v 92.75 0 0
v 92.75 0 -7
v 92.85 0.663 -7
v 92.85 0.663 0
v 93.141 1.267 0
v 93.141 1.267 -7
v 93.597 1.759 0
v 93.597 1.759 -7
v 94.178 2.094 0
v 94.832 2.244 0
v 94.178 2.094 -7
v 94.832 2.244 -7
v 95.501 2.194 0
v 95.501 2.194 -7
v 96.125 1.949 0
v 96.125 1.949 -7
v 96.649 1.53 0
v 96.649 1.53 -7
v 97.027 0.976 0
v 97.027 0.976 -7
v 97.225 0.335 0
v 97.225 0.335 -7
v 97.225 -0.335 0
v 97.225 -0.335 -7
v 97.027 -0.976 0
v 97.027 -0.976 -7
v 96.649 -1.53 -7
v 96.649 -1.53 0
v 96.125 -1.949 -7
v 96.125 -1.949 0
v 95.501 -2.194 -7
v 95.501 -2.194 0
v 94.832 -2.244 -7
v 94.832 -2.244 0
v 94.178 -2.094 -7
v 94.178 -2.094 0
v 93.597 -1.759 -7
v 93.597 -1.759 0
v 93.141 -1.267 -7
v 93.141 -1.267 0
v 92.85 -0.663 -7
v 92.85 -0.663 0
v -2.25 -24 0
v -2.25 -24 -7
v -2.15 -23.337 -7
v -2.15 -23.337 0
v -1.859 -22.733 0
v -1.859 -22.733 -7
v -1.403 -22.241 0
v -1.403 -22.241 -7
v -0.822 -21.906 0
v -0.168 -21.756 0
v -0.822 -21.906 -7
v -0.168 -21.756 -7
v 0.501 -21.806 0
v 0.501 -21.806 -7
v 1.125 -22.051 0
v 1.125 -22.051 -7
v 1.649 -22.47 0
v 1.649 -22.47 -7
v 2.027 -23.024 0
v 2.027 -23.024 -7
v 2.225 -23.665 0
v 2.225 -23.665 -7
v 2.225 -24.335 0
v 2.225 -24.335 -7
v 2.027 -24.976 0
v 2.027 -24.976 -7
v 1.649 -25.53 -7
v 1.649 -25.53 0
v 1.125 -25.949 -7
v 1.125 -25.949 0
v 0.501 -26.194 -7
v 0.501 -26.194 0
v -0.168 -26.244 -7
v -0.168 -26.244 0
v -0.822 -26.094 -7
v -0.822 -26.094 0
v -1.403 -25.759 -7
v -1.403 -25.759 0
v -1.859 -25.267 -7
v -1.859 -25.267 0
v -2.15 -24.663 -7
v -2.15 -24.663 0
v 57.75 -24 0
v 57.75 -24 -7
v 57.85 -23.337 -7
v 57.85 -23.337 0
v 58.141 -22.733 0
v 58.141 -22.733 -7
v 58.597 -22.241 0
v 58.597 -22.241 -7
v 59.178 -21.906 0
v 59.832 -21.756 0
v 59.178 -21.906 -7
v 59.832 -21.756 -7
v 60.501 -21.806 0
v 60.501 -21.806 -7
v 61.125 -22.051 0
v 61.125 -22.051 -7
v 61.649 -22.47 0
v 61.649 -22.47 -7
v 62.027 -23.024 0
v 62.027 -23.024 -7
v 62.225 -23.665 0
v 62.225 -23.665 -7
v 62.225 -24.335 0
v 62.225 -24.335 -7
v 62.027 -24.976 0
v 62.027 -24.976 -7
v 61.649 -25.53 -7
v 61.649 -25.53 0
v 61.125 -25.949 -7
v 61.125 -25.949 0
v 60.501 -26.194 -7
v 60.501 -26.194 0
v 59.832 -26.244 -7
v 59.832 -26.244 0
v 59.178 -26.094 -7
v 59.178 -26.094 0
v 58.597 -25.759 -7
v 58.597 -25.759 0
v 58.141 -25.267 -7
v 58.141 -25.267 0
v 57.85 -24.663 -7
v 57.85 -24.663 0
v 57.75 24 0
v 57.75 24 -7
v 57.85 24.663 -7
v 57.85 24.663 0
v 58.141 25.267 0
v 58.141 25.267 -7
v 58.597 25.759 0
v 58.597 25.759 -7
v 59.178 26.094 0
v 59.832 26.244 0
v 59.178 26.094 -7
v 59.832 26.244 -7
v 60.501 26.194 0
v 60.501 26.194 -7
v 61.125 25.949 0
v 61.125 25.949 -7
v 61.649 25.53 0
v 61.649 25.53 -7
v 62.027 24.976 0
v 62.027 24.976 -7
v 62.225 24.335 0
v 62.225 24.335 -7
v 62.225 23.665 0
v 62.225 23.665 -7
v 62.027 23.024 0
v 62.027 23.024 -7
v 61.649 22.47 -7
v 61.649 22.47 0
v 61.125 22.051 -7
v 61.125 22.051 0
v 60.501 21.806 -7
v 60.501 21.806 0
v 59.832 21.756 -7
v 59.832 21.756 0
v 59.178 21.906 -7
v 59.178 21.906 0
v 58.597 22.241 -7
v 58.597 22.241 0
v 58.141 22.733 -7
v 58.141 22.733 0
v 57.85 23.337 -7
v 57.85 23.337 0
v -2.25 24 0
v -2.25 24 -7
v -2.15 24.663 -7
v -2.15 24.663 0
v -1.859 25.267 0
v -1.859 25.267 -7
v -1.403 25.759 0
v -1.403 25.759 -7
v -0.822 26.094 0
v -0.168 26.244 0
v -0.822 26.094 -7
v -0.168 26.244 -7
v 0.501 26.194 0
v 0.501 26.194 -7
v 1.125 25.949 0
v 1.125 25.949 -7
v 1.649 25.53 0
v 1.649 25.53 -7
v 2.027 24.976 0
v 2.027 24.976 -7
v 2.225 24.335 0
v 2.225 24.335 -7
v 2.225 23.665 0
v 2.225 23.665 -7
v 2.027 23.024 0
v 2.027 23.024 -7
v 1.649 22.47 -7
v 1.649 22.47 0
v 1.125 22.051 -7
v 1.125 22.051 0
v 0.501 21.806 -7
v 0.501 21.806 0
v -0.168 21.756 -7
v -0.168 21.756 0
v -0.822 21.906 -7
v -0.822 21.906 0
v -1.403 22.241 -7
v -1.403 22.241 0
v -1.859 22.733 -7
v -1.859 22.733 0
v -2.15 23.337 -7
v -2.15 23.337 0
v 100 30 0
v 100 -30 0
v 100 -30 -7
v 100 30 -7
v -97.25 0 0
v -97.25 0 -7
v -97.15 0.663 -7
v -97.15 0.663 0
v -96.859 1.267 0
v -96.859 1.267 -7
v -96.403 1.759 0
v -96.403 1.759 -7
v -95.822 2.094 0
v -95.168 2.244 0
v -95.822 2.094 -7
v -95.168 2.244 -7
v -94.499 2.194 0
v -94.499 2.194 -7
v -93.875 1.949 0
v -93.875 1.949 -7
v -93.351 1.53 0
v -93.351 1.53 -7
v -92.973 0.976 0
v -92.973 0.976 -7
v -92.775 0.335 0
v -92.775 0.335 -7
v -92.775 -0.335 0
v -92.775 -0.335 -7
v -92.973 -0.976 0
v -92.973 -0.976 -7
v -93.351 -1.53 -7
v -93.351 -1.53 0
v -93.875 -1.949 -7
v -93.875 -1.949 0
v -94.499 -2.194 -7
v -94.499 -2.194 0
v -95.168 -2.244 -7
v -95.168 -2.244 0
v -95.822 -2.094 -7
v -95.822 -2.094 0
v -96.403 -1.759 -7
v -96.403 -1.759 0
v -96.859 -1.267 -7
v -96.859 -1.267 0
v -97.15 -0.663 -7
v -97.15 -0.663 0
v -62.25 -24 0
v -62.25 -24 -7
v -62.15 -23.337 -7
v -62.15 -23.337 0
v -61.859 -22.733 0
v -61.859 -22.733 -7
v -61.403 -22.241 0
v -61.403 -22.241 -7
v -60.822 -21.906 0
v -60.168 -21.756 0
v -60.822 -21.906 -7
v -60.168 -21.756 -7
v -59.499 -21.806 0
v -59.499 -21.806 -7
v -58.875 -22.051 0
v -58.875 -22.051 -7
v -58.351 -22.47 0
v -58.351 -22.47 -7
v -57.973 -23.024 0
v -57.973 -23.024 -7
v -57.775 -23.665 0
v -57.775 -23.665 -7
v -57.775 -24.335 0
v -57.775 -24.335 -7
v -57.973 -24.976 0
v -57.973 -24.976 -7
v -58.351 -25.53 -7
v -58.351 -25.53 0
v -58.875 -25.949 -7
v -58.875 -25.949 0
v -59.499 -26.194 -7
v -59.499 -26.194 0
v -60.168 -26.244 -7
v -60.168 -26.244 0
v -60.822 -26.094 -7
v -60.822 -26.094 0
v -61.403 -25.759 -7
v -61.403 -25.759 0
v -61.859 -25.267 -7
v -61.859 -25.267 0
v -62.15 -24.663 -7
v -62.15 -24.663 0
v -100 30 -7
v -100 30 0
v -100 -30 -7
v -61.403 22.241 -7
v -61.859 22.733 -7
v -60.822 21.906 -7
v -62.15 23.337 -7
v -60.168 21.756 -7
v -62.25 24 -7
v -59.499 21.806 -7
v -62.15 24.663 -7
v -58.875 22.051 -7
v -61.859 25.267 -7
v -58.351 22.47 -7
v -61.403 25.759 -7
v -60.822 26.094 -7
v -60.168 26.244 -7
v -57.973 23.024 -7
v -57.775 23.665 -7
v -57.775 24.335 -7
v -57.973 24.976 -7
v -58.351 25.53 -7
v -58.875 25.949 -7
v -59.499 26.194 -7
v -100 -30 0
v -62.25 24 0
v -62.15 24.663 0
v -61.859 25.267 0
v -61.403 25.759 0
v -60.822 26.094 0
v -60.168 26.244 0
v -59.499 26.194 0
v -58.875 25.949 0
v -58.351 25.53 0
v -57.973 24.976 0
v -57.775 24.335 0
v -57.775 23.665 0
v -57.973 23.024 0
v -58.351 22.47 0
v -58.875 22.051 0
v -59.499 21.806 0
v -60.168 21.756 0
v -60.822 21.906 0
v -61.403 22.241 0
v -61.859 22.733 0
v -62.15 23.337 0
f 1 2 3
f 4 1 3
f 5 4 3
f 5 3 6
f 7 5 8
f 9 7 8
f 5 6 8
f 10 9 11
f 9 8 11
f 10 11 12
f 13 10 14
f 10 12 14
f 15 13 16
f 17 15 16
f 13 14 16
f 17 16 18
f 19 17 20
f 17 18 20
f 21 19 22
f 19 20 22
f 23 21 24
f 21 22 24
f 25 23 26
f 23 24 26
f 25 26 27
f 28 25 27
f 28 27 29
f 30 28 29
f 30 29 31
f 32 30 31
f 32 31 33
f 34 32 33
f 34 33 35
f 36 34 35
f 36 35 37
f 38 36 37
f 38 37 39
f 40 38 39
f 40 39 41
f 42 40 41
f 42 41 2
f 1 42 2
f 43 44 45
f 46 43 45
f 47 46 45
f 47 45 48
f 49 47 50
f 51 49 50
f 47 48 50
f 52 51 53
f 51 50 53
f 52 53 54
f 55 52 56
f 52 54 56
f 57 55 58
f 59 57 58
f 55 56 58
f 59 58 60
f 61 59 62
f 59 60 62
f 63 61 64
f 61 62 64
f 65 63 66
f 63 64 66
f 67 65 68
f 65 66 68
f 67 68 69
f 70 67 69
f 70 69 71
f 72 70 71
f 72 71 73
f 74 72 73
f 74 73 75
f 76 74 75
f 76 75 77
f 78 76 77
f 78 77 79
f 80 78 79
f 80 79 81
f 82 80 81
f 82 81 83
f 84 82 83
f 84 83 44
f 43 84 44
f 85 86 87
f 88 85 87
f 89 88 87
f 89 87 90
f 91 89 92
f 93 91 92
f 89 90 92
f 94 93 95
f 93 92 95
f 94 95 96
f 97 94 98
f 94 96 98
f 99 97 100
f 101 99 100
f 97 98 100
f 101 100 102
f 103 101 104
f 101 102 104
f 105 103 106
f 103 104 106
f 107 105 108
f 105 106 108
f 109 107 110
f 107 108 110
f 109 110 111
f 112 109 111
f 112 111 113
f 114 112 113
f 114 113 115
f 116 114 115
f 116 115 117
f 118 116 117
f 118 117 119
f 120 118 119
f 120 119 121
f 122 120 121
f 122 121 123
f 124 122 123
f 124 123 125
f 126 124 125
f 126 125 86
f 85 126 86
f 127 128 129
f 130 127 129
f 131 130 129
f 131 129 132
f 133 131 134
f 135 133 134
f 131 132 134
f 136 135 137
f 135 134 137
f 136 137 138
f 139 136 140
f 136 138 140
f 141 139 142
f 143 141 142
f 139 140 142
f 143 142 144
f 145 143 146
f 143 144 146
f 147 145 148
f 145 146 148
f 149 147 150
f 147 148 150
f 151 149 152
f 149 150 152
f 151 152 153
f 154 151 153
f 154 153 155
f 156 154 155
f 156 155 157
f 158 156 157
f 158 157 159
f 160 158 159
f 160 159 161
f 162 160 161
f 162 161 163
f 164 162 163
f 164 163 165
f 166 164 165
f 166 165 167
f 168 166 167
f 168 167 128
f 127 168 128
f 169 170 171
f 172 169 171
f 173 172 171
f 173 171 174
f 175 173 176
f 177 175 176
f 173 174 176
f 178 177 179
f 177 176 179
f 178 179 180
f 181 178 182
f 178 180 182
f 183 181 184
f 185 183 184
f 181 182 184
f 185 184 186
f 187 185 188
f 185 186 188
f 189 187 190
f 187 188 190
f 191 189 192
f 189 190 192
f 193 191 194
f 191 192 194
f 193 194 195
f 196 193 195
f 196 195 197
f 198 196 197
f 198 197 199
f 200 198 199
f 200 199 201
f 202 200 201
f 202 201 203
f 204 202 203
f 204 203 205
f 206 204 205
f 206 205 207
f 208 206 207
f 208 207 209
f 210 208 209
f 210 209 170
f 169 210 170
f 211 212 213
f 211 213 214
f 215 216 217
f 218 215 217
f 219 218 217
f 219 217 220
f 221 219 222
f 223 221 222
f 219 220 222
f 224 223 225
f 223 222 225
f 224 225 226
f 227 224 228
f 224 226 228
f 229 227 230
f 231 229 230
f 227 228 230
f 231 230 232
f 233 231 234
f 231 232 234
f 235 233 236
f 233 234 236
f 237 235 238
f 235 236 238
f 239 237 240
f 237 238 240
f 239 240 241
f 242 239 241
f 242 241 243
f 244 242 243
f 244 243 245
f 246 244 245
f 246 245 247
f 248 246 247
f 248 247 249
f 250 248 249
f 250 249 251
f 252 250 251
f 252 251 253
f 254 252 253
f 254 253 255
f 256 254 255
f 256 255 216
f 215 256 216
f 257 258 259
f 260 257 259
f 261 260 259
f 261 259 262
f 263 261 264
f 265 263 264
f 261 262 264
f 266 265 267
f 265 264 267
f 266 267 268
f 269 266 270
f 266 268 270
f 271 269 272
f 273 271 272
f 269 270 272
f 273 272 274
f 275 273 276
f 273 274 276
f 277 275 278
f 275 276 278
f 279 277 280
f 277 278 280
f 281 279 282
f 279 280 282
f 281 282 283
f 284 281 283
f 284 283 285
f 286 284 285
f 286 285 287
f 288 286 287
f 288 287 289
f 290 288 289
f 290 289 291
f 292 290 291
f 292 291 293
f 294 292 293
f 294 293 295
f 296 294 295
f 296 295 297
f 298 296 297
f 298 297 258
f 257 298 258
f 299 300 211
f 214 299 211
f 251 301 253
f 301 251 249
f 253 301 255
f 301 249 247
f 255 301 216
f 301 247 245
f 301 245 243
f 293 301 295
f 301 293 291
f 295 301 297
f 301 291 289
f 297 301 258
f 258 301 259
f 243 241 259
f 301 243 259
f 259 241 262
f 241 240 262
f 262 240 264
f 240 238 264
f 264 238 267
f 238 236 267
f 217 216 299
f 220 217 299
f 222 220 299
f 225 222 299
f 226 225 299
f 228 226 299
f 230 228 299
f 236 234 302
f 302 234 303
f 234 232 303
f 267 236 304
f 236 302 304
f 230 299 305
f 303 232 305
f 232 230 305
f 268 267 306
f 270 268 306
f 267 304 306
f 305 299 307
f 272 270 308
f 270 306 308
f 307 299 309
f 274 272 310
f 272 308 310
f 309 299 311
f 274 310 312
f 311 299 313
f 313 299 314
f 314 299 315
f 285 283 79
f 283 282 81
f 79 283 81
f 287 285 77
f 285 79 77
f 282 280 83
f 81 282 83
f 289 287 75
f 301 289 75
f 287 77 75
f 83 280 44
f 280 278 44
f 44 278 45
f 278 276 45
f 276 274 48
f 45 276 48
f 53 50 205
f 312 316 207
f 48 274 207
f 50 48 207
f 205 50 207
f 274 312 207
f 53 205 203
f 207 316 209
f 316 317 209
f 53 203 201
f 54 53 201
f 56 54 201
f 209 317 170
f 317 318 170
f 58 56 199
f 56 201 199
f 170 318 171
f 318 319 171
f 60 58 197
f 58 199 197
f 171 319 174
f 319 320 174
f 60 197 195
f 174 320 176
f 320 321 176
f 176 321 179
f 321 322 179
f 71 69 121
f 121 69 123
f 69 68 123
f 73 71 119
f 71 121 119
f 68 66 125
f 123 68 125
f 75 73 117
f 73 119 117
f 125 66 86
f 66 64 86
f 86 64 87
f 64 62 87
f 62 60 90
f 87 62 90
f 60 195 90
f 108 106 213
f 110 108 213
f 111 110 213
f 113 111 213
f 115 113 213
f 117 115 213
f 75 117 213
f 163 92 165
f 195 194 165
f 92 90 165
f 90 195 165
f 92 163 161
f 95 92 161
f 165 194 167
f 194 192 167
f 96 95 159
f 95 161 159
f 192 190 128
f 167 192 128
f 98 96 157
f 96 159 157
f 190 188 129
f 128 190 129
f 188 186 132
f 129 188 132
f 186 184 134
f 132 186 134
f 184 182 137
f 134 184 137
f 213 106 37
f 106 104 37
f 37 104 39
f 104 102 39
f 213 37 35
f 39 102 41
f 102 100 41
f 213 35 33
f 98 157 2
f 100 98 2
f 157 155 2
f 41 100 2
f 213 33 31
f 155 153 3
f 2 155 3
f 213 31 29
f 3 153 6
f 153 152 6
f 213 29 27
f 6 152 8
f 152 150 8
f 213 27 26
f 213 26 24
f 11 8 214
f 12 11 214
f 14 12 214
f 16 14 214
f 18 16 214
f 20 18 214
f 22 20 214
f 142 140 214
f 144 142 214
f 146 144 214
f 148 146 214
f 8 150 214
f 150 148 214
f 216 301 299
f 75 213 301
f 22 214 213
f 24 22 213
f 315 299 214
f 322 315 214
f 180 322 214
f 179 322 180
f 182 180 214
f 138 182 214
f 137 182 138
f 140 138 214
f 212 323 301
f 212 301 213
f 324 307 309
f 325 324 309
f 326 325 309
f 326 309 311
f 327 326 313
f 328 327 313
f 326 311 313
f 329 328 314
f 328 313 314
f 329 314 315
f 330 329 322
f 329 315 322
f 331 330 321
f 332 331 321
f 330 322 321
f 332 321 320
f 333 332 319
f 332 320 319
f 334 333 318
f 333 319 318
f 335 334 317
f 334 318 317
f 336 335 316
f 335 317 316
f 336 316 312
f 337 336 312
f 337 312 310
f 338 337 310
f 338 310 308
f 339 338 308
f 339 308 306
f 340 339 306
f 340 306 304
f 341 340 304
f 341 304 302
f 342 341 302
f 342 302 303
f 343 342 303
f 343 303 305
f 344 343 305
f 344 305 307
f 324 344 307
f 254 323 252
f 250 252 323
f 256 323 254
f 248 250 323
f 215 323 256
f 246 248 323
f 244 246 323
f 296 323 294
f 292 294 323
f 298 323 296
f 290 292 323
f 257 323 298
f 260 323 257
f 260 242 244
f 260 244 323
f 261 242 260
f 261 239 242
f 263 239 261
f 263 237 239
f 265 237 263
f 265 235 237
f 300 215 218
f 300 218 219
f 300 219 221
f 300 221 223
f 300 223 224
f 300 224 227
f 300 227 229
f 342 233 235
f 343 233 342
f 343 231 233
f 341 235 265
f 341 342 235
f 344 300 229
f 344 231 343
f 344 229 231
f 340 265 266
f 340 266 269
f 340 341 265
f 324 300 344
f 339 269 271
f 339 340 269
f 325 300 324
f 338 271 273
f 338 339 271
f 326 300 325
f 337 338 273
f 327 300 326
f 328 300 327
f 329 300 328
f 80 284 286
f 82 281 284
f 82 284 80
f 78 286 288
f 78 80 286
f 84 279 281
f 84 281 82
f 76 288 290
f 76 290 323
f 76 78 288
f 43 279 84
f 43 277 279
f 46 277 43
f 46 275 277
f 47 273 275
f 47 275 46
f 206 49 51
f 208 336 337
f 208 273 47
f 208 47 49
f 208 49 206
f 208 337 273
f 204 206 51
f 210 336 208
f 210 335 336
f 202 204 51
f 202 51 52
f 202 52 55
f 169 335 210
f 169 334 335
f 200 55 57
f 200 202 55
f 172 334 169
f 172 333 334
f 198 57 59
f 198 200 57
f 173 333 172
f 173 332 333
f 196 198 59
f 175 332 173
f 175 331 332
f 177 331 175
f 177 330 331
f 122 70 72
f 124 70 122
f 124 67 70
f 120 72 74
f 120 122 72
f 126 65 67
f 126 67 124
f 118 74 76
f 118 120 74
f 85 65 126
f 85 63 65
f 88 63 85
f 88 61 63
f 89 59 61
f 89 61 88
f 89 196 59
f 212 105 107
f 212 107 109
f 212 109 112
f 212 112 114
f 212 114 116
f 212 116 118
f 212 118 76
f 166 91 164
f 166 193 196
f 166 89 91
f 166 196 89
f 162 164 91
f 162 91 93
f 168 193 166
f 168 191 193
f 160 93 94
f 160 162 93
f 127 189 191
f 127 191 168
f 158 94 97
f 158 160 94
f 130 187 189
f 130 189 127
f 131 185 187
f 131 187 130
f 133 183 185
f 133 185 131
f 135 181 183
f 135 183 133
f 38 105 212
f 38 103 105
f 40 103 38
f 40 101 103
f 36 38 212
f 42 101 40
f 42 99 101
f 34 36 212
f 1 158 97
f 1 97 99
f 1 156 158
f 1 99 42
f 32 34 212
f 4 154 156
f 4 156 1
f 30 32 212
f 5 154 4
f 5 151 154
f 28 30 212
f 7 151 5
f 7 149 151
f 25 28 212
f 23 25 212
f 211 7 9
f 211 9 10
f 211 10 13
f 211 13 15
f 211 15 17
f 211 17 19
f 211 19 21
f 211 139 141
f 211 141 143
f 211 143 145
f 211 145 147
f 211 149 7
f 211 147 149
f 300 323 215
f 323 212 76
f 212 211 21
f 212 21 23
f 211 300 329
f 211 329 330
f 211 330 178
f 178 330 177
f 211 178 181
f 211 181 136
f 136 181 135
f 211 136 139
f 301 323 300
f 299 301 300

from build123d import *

# Parameters (mm, degrees)
F0_W     = 200
F0_H     = 60
F1_DEPTH = 7
F2_D     = 4.5


with BuildPart() as f1:
    # F0 (on Top) → F1 (new body)
    with BuildSketch(Plane.XY):
        Rectangle(F0_W, F0_H)
    extrude(amount=-F1_DEPTH)

    # F2 (through all)
    with Locations(Plane.XY):
        with Locations((-60, 24), (60, 24), (60, -24), (-60, -24), (-95, 0), (95, 0), (0, 24), (0, -24)):
            Hole(F2_D / 2)


solid = f1.part
